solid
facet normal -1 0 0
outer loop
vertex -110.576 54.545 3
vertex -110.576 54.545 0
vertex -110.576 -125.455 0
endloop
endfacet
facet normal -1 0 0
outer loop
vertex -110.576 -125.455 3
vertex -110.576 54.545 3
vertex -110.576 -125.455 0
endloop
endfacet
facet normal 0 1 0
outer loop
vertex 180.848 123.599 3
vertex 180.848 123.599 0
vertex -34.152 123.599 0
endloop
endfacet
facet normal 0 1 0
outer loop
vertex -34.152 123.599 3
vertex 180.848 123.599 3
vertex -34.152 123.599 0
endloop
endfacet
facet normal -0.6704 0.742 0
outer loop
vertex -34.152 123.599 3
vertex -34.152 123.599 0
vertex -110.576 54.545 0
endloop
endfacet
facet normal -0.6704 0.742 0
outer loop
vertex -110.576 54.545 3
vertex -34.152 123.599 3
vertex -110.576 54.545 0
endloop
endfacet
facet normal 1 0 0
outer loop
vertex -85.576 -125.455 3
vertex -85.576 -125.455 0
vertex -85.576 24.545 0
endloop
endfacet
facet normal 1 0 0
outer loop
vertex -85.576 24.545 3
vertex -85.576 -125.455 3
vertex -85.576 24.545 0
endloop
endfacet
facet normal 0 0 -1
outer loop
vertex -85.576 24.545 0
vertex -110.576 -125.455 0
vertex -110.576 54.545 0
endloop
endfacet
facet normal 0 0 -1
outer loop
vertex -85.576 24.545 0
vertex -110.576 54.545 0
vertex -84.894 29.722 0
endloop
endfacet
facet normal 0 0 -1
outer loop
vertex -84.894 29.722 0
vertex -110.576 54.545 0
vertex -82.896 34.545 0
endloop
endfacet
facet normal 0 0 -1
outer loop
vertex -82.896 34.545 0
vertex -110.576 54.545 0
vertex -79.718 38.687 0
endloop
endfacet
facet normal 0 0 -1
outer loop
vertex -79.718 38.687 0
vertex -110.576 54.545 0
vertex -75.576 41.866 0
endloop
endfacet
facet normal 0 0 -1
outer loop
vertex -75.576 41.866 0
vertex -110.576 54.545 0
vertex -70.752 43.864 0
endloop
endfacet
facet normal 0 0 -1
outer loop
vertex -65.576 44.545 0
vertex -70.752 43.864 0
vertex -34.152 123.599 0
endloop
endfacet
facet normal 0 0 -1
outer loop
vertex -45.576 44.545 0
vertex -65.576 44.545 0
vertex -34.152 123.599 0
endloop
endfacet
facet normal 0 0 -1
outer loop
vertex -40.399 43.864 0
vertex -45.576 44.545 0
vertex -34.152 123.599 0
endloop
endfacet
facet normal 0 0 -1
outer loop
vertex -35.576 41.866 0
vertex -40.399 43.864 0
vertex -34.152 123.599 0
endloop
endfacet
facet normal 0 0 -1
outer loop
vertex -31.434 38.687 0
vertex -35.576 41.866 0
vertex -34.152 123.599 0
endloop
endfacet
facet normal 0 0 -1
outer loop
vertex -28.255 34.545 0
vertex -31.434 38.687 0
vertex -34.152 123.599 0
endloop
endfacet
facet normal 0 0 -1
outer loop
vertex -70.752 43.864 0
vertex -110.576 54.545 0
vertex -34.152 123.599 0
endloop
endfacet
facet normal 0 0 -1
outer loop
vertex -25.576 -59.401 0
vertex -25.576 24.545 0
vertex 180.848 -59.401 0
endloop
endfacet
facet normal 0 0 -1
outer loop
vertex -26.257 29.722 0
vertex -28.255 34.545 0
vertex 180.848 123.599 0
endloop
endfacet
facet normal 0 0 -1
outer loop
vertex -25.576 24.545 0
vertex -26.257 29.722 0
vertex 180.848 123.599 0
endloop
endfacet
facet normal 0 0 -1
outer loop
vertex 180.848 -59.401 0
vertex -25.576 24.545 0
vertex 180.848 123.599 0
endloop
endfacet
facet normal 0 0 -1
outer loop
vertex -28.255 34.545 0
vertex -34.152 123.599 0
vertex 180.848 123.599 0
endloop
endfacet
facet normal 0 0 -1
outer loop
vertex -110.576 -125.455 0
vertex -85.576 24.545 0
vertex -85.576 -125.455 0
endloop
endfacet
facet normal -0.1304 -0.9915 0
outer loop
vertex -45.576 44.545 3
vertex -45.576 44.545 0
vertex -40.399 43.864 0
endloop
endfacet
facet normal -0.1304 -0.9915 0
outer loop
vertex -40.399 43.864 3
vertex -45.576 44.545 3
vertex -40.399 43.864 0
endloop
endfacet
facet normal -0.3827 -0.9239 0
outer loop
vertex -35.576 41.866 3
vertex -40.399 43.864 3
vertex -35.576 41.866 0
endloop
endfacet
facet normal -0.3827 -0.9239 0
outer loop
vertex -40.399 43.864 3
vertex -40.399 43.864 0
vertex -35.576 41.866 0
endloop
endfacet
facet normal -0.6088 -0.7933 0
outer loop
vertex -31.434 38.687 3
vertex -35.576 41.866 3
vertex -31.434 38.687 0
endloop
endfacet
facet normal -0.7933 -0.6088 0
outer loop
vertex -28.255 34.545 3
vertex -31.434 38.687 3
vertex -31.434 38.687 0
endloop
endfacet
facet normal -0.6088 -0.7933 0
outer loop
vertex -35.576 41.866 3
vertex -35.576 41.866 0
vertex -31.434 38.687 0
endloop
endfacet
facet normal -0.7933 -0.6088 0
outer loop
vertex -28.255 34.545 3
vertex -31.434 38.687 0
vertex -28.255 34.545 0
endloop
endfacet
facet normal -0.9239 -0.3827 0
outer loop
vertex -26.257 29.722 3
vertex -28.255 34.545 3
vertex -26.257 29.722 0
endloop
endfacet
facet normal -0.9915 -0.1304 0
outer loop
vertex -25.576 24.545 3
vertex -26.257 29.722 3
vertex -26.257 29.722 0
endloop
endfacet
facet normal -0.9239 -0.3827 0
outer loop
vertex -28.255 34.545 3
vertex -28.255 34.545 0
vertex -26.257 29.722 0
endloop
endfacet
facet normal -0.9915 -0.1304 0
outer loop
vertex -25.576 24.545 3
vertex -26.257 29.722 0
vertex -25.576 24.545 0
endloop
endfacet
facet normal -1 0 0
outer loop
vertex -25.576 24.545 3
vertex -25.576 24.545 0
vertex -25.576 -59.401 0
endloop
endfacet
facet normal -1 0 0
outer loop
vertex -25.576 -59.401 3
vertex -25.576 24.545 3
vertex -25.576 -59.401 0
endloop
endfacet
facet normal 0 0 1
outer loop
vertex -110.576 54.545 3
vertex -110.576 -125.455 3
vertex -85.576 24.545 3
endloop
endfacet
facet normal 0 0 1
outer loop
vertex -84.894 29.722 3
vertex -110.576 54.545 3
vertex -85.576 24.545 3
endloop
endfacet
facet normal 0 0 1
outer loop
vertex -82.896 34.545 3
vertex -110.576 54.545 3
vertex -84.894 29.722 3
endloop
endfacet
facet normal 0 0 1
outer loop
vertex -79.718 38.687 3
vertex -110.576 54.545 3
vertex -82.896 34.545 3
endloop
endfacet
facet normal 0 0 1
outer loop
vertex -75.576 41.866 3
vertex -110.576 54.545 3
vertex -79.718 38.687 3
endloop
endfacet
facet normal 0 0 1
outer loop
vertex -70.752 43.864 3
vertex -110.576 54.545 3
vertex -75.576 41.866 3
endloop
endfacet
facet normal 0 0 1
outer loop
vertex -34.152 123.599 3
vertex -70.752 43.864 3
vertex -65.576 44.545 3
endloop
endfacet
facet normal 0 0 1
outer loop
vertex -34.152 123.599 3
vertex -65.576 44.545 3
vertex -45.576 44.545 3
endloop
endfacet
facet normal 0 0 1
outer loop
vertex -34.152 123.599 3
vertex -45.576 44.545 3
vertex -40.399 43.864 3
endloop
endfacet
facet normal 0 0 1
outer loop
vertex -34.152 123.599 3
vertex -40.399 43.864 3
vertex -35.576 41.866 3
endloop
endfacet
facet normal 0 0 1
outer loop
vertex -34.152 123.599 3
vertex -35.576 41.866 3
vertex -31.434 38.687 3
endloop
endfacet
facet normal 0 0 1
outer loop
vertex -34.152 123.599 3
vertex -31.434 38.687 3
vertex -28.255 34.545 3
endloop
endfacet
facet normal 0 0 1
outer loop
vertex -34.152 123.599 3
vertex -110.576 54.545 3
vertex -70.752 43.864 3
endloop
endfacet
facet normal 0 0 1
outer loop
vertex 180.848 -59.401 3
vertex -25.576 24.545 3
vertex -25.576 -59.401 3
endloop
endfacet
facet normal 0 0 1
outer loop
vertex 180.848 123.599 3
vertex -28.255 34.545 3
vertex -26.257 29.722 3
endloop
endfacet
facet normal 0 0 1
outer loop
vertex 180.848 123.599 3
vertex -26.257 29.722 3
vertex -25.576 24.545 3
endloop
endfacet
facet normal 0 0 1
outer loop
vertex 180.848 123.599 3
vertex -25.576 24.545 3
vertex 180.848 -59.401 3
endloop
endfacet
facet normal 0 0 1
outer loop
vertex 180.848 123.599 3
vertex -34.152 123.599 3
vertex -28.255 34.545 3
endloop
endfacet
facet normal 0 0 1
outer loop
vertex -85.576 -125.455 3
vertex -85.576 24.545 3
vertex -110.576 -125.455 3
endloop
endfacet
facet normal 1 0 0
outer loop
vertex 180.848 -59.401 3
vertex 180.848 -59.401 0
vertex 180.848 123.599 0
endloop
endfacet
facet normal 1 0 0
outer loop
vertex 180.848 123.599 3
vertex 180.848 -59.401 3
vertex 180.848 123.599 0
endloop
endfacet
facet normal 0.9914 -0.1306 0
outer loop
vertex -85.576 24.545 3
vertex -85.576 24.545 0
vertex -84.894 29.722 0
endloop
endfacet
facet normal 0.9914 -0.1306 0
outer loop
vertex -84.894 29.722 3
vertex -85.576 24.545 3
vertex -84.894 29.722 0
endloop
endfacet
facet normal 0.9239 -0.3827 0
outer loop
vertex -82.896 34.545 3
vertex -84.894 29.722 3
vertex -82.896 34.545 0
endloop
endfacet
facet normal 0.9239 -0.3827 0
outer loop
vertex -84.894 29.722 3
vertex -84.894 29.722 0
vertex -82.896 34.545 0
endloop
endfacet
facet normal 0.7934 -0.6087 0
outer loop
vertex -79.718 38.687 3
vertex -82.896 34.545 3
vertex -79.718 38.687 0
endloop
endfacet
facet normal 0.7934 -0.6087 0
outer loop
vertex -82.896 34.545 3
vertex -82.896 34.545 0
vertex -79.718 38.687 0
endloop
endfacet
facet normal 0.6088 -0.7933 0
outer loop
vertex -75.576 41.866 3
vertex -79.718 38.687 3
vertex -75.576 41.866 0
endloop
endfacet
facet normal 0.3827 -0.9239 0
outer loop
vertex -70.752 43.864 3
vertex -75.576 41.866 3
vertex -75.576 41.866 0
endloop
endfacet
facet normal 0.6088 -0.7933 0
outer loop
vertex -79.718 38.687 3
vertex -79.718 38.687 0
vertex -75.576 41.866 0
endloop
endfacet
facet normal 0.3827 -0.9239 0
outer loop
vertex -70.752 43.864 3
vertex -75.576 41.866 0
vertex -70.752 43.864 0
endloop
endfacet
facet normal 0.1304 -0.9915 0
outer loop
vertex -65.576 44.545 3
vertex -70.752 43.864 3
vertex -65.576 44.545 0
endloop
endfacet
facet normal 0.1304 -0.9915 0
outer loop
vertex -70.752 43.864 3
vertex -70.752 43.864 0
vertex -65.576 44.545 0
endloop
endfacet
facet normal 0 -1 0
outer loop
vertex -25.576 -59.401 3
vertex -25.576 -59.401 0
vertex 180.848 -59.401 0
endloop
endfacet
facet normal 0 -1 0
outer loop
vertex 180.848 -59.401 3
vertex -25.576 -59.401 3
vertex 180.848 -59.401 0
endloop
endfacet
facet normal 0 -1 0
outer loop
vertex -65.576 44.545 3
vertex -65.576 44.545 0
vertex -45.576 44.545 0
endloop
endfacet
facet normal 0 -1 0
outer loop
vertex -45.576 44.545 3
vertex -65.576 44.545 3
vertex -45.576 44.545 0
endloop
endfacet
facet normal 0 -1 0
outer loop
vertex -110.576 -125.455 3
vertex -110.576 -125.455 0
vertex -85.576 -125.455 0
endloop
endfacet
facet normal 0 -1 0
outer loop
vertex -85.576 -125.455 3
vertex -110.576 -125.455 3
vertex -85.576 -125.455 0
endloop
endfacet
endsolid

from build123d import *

# Parameters (mm, degrees)
F1_DEPTH = 3


with BuildPart() as f1:
    # F0 (on Top) → F1 (new body)
    with BuildSketch(Plane.XY):
        with BuildLine():
            Line((-34.152171, 123.5992), (-110.575682, 54.545258))
            Line((-110.575682, 54.545258), (-110.575682, -125.454742))
            Line((-110.575682, -125.454742), (-85.575682, -125.454742))
            Line((-85.575682, -125.454742), (-85.575682, 24.545258))
            ThreePointArc((-85.575682, 24.545258), (-79.717818, 38.687394), (-65.575682, 44.545258))
            Line((-65.575682, 44.545258), (-45.575682, 44.545258))
            ThreePointArc((-45.575682, 44.545258), (-31.433547, 38.687394), (-25.575682, 24.545258))
            Line((-25.575682, 24.545258), (-25.575682, -59.4008))
            Line((-25.575682, -59.4008), (180.847829, -59.4008))
            Line((180.847829, -59.4008), (180.847829, 123.5992))
            Line((180.847829, 123.5992), (-34.152171, 123.5992))
        make_face()
    extrude(amount=F1_DEPTH)


solid = f1.part
